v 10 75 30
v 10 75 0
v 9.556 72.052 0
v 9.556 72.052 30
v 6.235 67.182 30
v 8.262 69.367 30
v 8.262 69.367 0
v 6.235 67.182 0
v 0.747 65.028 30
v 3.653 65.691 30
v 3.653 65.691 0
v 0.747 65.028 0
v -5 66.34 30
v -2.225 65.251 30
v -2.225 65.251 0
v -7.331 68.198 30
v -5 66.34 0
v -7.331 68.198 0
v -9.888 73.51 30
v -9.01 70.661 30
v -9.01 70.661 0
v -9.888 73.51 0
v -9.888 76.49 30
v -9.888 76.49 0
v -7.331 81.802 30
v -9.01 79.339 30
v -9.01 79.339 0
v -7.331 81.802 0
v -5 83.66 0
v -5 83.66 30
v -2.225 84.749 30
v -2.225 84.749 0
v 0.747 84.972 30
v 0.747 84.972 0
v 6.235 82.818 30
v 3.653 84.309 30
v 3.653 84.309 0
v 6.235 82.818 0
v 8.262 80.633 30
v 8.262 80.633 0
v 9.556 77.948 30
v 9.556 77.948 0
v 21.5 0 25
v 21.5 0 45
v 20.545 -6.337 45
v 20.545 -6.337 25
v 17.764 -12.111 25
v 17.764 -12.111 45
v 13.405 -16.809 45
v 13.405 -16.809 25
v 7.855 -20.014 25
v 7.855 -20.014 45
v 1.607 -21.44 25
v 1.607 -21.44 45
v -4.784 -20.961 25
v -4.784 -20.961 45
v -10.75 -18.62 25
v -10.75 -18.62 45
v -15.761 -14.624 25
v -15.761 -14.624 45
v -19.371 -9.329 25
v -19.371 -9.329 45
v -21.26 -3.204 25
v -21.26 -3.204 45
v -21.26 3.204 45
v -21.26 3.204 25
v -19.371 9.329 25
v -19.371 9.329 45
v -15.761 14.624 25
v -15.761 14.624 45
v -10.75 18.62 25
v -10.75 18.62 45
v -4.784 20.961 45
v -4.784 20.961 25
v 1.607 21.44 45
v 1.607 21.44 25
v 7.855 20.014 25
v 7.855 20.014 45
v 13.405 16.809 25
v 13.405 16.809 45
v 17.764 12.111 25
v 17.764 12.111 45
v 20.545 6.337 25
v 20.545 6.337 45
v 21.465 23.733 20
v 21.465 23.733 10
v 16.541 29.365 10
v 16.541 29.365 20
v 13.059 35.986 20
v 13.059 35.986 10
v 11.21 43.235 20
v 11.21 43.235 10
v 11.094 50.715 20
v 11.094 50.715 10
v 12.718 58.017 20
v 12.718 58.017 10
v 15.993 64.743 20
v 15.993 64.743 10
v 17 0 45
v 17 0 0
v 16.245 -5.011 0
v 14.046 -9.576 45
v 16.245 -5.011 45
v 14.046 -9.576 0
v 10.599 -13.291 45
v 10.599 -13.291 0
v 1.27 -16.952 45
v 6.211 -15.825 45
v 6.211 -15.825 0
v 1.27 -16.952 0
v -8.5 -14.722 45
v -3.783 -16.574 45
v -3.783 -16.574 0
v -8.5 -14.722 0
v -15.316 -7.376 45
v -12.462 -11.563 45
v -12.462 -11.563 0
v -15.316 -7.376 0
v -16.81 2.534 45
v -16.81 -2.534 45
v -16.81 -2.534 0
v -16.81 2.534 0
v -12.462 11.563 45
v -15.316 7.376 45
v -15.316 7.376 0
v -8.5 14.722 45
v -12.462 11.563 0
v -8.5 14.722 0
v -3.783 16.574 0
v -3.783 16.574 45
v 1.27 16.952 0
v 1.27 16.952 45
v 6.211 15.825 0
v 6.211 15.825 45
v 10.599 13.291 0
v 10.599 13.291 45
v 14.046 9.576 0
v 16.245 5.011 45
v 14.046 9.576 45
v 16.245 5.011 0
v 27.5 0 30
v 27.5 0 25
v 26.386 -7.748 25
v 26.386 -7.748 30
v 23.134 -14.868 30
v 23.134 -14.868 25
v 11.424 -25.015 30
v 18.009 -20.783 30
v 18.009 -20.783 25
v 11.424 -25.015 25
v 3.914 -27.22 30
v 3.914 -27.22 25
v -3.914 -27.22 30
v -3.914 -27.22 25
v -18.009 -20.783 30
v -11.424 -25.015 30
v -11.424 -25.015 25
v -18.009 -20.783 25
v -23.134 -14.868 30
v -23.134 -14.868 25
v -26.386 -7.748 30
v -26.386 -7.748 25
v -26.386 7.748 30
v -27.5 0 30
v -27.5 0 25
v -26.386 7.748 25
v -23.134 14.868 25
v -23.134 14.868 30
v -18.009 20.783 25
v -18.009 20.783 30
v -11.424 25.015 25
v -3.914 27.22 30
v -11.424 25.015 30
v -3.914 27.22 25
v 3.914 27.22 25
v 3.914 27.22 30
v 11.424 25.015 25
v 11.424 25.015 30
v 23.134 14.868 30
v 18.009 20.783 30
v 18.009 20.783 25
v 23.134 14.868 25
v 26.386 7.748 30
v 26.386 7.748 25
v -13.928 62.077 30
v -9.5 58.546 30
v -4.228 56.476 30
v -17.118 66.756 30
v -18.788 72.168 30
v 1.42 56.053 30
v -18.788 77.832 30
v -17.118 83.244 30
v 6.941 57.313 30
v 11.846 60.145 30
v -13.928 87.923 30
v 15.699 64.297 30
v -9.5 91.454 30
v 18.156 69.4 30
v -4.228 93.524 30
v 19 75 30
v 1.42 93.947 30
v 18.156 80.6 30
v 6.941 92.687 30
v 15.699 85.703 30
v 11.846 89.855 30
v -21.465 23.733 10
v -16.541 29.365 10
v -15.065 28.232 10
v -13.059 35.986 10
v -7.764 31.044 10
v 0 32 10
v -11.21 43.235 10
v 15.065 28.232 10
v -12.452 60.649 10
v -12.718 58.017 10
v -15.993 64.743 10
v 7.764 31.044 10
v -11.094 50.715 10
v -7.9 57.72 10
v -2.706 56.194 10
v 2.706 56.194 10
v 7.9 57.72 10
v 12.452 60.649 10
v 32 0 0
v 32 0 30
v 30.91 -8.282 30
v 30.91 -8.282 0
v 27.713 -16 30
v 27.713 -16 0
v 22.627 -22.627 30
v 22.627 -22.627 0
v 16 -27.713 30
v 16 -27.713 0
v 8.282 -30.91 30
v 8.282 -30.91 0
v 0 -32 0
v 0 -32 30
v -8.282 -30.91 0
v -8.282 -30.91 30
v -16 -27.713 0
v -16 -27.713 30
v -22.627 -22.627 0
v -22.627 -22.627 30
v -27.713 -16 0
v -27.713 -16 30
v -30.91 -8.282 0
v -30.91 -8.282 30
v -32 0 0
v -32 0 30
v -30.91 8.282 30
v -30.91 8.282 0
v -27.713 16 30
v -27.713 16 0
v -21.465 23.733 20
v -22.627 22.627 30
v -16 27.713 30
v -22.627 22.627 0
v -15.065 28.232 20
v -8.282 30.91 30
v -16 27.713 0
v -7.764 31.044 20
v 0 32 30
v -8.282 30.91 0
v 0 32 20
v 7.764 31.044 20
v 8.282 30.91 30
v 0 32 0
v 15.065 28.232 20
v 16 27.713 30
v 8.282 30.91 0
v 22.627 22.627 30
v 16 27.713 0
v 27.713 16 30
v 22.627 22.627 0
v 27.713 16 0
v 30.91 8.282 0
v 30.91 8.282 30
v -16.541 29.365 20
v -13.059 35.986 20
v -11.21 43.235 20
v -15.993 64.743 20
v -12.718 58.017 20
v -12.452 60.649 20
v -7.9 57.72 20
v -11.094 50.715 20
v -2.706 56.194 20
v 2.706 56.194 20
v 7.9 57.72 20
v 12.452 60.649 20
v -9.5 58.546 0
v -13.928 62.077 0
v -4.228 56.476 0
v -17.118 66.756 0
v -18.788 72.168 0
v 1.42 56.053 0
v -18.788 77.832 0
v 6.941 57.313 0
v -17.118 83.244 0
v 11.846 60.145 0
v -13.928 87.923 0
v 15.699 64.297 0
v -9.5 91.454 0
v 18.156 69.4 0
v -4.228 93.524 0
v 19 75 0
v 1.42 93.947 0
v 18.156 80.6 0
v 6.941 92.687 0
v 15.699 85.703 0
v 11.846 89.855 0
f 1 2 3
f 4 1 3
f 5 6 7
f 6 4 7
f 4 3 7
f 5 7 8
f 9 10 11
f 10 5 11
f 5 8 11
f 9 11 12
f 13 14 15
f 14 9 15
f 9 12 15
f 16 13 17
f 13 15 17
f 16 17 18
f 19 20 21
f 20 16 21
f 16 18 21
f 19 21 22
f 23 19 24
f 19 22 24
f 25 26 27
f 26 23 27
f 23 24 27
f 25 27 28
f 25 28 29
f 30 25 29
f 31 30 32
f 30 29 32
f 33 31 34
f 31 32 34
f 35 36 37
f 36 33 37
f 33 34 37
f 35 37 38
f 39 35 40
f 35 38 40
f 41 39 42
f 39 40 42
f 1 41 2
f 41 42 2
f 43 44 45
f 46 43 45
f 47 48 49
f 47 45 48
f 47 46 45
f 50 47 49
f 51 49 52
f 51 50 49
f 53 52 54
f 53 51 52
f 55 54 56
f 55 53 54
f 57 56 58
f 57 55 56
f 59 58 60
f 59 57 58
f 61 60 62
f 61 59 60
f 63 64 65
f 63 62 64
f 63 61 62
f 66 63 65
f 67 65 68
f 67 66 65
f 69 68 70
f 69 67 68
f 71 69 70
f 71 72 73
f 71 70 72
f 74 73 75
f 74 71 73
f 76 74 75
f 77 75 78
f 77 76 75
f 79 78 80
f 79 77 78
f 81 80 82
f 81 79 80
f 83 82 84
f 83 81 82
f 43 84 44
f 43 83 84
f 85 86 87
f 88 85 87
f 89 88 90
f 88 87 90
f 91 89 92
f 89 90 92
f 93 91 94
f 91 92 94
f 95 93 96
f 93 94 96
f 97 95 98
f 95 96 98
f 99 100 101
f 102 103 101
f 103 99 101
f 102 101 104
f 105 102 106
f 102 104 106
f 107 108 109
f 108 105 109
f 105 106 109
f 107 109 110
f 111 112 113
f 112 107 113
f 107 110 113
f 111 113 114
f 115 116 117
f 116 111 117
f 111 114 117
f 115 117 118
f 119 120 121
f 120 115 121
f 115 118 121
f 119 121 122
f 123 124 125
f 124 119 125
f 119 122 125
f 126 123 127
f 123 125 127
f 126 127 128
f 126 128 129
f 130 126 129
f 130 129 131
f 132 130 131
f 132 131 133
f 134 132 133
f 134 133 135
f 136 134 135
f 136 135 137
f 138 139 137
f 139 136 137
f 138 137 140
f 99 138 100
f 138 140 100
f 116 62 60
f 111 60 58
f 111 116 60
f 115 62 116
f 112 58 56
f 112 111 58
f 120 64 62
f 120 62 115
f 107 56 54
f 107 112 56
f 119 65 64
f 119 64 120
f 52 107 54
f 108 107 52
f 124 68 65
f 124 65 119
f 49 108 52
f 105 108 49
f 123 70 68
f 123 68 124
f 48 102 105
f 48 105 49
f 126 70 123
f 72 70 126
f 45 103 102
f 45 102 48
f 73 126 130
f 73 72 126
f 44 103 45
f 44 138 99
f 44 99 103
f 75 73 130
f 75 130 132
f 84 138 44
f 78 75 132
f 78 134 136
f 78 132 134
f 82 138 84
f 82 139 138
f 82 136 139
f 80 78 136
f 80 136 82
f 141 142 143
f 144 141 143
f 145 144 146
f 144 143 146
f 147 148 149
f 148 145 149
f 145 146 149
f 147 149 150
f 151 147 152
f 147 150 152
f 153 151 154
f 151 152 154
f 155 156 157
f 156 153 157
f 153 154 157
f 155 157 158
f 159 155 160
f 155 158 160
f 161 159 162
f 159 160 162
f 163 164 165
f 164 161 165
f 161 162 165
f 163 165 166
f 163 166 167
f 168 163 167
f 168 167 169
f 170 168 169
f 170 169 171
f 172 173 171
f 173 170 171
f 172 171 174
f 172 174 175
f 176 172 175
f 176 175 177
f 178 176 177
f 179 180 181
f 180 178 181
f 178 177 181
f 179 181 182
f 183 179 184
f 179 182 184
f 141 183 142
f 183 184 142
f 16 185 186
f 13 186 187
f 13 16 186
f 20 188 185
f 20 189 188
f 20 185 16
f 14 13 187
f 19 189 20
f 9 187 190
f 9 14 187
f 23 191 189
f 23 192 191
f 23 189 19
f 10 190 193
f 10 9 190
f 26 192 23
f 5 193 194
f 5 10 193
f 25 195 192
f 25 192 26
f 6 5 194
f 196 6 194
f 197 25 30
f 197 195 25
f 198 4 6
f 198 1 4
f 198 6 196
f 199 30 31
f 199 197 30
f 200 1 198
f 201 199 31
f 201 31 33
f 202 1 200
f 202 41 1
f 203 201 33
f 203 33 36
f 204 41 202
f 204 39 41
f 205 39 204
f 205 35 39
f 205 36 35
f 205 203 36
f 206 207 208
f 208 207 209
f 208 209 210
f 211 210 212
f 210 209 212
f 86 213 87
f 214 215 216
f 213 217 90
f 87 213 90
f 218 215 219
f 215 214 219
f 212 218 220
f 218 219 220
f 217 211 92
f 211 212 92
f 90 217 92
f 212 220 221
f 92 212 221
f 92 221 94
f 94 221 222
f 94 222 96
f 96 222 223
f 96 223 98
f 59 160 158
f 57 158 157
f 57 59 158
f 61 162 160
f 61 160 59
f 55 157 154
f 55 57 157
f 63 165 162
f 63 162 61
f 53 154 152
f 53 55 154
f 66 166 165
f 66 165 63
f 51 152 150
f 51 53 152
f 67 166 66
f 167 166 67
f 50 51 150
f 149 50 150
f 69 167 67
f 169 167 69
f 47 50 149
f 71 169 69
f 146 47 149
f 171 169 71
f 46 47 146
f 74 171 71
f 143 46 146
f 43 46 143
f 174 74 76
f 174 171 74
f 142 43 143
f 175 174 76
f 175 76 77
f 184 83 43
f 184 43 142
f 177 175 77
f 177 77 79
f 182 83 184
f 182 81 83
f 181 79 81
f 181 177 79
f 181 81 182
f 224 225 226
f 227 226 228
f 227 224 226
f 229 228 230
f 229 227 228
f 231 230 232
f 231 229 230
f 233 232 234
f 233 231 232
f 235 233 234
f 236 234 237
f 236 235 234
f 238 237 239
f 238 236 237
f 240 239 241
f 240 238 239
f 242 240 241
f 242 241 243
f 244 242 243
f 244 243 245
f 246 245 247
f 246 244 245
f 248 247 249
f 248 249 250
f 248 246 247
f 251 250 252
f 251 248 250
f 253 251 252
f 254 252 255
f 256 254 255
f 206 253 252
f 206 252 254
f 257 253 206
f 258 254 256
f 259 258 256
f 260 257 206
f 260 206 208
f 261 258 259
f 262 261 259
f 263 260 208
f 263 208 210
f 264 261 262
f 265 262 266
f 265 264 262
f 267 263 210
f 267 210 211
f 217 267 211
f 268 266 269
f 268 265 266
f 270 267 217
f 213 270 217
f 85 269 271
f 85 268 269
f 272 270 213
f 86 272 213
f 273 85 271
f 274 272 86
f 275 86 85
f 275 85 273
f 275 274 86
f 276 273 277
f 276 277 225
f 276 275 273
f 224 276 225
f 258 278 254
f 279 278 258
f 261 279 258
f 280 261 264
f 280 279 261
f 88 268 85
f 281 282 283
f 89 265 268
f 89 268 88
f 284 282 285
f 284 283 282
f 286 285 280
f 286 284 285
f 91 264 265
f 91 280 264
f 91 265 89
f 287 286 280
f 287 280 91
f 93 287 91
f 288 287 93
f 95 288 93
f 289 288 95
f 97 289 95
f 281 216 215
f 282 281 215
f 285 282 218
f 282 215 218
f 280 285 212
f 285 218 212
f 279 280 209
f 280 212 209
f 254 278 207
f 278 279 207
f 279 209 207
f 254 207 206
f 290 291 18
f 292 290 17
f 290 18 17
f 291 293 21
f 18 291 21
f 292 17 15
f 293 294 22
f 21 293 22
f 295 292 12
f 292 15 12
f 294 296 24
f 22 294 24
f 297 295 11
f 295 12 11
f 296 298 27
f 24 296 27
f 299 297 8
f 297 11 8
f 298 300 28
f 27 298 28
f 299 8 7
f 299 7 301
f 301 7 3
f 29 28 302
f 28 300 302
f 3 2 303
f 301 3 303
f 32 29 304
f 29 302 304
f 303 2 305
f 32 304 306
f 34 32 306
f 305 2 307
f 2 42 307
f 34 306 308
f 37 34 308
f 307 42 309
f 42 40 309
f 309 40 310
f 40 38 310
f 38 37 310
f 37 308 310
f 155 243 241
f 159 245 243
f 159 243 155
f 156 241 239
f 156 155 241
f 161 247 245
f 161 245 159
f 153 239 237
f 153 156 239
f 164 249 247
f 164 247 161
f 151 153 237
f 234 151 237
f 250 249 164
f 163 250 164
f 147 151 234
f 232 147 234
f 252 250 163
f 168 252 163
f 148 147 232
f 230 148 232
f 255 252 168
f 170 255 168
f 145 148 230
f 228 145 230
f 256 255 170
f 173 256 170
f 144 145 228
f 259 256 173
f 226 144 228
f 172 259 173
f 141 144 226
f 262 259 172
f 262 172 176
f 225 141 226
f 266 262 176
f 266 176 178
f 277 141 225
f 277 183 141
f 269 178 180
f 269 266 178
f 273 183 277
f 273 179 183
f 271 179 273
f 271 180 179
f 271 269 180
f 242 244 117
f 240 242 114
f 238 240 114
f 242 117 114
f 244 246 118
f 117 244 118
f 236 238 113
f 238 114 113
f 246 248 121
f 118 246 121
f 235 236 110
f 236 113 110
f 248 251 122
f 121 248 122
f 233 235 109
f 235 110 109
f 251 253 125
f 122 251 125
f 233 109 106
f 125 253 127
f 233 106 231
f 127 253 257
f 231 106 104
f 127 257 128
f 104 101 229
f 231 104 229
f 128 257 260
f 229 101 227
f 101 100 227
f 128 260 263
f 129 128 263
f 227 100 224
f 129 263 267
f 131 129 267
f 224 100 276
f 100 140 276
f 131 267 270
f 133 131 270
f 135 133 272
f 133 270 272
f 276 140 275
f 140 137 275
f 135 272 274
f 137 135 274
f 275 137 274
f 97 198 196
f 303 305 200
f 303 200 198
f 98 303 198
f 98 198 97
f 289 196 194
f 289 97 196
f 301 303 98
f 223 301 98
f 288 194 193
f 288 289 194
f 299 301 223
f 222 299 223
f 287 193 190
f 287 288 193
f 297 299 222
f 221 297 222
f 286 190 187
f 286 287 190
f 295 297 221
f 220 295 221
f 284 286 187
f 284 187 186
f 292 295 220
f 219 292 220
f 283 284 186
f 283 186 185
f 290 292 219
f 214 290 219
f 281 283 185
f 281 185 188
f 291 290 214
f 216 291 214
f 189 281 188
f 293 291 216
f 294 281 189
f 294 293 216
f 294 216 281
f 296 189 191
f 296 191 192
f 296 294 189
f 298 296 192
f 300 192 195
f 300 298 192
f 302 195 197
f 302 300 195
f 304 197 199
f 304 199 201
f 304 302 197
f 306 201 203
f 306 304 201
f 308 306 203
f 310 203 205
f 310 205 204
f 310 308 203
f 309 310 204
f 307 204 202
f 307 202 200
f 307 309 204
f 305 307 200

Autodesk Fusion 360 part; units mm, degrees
sketch "Esboço1" plane through (0, 0, 0) normal (0, 0, 1) x (1, 0, 0)
  circle A0 centre (0, 0) radius 17
  circle A1 centre (0, 0) radius 21.5
  circle A2 centre (0, 0) radius 27.5
  circle A3 centre (0, 0) radius 32
  circle A4 centre (0, 75) radius 10
  circle A5 centre (0, 75) radius 19
  arc A6 (-21.4646, 23.7333) -> (-15.9932, 64.7425) centre (-42.9292, 47.4667) ccw
  arc A7 (15.9932, 64.7425) -> (21.4646, 23.7333) centre (42.9292, 47.4667) ccw
  dimension "d1" = 34
  dimension "d2" = 43
  dimension "d3" = 55
  dimension "d4" = 64
  dimension "d5" = 75
  dimension "d6" = 20
  dimension "d7" = 38
  dimension "d8" = 64
extrude "Extrusão1" add sketch "Esboço1" along normal blind 30 contours A5 makes body 1
extrude "Extrusão2" add sketch "Esboço1" along normal blind 30 separate body contours A3 makes body 2
extrude "Extrusão3" add sketch "Esboço1" along normal blind 25 contours A2 bodies 2
extrude "Extrusão4" add sketch "Esboço1" along normal blind 45 contours A1 bodies 2
extrude "Extrusão5" add sketch "Esboço1" along normal blind 20 contours A3 A5 A6 A7 bodies 1 2
extrude "Extrusão6" cut sketch "Esboço1" along normal blind 10 contours A3 A5 A6 A7 bodies 1
